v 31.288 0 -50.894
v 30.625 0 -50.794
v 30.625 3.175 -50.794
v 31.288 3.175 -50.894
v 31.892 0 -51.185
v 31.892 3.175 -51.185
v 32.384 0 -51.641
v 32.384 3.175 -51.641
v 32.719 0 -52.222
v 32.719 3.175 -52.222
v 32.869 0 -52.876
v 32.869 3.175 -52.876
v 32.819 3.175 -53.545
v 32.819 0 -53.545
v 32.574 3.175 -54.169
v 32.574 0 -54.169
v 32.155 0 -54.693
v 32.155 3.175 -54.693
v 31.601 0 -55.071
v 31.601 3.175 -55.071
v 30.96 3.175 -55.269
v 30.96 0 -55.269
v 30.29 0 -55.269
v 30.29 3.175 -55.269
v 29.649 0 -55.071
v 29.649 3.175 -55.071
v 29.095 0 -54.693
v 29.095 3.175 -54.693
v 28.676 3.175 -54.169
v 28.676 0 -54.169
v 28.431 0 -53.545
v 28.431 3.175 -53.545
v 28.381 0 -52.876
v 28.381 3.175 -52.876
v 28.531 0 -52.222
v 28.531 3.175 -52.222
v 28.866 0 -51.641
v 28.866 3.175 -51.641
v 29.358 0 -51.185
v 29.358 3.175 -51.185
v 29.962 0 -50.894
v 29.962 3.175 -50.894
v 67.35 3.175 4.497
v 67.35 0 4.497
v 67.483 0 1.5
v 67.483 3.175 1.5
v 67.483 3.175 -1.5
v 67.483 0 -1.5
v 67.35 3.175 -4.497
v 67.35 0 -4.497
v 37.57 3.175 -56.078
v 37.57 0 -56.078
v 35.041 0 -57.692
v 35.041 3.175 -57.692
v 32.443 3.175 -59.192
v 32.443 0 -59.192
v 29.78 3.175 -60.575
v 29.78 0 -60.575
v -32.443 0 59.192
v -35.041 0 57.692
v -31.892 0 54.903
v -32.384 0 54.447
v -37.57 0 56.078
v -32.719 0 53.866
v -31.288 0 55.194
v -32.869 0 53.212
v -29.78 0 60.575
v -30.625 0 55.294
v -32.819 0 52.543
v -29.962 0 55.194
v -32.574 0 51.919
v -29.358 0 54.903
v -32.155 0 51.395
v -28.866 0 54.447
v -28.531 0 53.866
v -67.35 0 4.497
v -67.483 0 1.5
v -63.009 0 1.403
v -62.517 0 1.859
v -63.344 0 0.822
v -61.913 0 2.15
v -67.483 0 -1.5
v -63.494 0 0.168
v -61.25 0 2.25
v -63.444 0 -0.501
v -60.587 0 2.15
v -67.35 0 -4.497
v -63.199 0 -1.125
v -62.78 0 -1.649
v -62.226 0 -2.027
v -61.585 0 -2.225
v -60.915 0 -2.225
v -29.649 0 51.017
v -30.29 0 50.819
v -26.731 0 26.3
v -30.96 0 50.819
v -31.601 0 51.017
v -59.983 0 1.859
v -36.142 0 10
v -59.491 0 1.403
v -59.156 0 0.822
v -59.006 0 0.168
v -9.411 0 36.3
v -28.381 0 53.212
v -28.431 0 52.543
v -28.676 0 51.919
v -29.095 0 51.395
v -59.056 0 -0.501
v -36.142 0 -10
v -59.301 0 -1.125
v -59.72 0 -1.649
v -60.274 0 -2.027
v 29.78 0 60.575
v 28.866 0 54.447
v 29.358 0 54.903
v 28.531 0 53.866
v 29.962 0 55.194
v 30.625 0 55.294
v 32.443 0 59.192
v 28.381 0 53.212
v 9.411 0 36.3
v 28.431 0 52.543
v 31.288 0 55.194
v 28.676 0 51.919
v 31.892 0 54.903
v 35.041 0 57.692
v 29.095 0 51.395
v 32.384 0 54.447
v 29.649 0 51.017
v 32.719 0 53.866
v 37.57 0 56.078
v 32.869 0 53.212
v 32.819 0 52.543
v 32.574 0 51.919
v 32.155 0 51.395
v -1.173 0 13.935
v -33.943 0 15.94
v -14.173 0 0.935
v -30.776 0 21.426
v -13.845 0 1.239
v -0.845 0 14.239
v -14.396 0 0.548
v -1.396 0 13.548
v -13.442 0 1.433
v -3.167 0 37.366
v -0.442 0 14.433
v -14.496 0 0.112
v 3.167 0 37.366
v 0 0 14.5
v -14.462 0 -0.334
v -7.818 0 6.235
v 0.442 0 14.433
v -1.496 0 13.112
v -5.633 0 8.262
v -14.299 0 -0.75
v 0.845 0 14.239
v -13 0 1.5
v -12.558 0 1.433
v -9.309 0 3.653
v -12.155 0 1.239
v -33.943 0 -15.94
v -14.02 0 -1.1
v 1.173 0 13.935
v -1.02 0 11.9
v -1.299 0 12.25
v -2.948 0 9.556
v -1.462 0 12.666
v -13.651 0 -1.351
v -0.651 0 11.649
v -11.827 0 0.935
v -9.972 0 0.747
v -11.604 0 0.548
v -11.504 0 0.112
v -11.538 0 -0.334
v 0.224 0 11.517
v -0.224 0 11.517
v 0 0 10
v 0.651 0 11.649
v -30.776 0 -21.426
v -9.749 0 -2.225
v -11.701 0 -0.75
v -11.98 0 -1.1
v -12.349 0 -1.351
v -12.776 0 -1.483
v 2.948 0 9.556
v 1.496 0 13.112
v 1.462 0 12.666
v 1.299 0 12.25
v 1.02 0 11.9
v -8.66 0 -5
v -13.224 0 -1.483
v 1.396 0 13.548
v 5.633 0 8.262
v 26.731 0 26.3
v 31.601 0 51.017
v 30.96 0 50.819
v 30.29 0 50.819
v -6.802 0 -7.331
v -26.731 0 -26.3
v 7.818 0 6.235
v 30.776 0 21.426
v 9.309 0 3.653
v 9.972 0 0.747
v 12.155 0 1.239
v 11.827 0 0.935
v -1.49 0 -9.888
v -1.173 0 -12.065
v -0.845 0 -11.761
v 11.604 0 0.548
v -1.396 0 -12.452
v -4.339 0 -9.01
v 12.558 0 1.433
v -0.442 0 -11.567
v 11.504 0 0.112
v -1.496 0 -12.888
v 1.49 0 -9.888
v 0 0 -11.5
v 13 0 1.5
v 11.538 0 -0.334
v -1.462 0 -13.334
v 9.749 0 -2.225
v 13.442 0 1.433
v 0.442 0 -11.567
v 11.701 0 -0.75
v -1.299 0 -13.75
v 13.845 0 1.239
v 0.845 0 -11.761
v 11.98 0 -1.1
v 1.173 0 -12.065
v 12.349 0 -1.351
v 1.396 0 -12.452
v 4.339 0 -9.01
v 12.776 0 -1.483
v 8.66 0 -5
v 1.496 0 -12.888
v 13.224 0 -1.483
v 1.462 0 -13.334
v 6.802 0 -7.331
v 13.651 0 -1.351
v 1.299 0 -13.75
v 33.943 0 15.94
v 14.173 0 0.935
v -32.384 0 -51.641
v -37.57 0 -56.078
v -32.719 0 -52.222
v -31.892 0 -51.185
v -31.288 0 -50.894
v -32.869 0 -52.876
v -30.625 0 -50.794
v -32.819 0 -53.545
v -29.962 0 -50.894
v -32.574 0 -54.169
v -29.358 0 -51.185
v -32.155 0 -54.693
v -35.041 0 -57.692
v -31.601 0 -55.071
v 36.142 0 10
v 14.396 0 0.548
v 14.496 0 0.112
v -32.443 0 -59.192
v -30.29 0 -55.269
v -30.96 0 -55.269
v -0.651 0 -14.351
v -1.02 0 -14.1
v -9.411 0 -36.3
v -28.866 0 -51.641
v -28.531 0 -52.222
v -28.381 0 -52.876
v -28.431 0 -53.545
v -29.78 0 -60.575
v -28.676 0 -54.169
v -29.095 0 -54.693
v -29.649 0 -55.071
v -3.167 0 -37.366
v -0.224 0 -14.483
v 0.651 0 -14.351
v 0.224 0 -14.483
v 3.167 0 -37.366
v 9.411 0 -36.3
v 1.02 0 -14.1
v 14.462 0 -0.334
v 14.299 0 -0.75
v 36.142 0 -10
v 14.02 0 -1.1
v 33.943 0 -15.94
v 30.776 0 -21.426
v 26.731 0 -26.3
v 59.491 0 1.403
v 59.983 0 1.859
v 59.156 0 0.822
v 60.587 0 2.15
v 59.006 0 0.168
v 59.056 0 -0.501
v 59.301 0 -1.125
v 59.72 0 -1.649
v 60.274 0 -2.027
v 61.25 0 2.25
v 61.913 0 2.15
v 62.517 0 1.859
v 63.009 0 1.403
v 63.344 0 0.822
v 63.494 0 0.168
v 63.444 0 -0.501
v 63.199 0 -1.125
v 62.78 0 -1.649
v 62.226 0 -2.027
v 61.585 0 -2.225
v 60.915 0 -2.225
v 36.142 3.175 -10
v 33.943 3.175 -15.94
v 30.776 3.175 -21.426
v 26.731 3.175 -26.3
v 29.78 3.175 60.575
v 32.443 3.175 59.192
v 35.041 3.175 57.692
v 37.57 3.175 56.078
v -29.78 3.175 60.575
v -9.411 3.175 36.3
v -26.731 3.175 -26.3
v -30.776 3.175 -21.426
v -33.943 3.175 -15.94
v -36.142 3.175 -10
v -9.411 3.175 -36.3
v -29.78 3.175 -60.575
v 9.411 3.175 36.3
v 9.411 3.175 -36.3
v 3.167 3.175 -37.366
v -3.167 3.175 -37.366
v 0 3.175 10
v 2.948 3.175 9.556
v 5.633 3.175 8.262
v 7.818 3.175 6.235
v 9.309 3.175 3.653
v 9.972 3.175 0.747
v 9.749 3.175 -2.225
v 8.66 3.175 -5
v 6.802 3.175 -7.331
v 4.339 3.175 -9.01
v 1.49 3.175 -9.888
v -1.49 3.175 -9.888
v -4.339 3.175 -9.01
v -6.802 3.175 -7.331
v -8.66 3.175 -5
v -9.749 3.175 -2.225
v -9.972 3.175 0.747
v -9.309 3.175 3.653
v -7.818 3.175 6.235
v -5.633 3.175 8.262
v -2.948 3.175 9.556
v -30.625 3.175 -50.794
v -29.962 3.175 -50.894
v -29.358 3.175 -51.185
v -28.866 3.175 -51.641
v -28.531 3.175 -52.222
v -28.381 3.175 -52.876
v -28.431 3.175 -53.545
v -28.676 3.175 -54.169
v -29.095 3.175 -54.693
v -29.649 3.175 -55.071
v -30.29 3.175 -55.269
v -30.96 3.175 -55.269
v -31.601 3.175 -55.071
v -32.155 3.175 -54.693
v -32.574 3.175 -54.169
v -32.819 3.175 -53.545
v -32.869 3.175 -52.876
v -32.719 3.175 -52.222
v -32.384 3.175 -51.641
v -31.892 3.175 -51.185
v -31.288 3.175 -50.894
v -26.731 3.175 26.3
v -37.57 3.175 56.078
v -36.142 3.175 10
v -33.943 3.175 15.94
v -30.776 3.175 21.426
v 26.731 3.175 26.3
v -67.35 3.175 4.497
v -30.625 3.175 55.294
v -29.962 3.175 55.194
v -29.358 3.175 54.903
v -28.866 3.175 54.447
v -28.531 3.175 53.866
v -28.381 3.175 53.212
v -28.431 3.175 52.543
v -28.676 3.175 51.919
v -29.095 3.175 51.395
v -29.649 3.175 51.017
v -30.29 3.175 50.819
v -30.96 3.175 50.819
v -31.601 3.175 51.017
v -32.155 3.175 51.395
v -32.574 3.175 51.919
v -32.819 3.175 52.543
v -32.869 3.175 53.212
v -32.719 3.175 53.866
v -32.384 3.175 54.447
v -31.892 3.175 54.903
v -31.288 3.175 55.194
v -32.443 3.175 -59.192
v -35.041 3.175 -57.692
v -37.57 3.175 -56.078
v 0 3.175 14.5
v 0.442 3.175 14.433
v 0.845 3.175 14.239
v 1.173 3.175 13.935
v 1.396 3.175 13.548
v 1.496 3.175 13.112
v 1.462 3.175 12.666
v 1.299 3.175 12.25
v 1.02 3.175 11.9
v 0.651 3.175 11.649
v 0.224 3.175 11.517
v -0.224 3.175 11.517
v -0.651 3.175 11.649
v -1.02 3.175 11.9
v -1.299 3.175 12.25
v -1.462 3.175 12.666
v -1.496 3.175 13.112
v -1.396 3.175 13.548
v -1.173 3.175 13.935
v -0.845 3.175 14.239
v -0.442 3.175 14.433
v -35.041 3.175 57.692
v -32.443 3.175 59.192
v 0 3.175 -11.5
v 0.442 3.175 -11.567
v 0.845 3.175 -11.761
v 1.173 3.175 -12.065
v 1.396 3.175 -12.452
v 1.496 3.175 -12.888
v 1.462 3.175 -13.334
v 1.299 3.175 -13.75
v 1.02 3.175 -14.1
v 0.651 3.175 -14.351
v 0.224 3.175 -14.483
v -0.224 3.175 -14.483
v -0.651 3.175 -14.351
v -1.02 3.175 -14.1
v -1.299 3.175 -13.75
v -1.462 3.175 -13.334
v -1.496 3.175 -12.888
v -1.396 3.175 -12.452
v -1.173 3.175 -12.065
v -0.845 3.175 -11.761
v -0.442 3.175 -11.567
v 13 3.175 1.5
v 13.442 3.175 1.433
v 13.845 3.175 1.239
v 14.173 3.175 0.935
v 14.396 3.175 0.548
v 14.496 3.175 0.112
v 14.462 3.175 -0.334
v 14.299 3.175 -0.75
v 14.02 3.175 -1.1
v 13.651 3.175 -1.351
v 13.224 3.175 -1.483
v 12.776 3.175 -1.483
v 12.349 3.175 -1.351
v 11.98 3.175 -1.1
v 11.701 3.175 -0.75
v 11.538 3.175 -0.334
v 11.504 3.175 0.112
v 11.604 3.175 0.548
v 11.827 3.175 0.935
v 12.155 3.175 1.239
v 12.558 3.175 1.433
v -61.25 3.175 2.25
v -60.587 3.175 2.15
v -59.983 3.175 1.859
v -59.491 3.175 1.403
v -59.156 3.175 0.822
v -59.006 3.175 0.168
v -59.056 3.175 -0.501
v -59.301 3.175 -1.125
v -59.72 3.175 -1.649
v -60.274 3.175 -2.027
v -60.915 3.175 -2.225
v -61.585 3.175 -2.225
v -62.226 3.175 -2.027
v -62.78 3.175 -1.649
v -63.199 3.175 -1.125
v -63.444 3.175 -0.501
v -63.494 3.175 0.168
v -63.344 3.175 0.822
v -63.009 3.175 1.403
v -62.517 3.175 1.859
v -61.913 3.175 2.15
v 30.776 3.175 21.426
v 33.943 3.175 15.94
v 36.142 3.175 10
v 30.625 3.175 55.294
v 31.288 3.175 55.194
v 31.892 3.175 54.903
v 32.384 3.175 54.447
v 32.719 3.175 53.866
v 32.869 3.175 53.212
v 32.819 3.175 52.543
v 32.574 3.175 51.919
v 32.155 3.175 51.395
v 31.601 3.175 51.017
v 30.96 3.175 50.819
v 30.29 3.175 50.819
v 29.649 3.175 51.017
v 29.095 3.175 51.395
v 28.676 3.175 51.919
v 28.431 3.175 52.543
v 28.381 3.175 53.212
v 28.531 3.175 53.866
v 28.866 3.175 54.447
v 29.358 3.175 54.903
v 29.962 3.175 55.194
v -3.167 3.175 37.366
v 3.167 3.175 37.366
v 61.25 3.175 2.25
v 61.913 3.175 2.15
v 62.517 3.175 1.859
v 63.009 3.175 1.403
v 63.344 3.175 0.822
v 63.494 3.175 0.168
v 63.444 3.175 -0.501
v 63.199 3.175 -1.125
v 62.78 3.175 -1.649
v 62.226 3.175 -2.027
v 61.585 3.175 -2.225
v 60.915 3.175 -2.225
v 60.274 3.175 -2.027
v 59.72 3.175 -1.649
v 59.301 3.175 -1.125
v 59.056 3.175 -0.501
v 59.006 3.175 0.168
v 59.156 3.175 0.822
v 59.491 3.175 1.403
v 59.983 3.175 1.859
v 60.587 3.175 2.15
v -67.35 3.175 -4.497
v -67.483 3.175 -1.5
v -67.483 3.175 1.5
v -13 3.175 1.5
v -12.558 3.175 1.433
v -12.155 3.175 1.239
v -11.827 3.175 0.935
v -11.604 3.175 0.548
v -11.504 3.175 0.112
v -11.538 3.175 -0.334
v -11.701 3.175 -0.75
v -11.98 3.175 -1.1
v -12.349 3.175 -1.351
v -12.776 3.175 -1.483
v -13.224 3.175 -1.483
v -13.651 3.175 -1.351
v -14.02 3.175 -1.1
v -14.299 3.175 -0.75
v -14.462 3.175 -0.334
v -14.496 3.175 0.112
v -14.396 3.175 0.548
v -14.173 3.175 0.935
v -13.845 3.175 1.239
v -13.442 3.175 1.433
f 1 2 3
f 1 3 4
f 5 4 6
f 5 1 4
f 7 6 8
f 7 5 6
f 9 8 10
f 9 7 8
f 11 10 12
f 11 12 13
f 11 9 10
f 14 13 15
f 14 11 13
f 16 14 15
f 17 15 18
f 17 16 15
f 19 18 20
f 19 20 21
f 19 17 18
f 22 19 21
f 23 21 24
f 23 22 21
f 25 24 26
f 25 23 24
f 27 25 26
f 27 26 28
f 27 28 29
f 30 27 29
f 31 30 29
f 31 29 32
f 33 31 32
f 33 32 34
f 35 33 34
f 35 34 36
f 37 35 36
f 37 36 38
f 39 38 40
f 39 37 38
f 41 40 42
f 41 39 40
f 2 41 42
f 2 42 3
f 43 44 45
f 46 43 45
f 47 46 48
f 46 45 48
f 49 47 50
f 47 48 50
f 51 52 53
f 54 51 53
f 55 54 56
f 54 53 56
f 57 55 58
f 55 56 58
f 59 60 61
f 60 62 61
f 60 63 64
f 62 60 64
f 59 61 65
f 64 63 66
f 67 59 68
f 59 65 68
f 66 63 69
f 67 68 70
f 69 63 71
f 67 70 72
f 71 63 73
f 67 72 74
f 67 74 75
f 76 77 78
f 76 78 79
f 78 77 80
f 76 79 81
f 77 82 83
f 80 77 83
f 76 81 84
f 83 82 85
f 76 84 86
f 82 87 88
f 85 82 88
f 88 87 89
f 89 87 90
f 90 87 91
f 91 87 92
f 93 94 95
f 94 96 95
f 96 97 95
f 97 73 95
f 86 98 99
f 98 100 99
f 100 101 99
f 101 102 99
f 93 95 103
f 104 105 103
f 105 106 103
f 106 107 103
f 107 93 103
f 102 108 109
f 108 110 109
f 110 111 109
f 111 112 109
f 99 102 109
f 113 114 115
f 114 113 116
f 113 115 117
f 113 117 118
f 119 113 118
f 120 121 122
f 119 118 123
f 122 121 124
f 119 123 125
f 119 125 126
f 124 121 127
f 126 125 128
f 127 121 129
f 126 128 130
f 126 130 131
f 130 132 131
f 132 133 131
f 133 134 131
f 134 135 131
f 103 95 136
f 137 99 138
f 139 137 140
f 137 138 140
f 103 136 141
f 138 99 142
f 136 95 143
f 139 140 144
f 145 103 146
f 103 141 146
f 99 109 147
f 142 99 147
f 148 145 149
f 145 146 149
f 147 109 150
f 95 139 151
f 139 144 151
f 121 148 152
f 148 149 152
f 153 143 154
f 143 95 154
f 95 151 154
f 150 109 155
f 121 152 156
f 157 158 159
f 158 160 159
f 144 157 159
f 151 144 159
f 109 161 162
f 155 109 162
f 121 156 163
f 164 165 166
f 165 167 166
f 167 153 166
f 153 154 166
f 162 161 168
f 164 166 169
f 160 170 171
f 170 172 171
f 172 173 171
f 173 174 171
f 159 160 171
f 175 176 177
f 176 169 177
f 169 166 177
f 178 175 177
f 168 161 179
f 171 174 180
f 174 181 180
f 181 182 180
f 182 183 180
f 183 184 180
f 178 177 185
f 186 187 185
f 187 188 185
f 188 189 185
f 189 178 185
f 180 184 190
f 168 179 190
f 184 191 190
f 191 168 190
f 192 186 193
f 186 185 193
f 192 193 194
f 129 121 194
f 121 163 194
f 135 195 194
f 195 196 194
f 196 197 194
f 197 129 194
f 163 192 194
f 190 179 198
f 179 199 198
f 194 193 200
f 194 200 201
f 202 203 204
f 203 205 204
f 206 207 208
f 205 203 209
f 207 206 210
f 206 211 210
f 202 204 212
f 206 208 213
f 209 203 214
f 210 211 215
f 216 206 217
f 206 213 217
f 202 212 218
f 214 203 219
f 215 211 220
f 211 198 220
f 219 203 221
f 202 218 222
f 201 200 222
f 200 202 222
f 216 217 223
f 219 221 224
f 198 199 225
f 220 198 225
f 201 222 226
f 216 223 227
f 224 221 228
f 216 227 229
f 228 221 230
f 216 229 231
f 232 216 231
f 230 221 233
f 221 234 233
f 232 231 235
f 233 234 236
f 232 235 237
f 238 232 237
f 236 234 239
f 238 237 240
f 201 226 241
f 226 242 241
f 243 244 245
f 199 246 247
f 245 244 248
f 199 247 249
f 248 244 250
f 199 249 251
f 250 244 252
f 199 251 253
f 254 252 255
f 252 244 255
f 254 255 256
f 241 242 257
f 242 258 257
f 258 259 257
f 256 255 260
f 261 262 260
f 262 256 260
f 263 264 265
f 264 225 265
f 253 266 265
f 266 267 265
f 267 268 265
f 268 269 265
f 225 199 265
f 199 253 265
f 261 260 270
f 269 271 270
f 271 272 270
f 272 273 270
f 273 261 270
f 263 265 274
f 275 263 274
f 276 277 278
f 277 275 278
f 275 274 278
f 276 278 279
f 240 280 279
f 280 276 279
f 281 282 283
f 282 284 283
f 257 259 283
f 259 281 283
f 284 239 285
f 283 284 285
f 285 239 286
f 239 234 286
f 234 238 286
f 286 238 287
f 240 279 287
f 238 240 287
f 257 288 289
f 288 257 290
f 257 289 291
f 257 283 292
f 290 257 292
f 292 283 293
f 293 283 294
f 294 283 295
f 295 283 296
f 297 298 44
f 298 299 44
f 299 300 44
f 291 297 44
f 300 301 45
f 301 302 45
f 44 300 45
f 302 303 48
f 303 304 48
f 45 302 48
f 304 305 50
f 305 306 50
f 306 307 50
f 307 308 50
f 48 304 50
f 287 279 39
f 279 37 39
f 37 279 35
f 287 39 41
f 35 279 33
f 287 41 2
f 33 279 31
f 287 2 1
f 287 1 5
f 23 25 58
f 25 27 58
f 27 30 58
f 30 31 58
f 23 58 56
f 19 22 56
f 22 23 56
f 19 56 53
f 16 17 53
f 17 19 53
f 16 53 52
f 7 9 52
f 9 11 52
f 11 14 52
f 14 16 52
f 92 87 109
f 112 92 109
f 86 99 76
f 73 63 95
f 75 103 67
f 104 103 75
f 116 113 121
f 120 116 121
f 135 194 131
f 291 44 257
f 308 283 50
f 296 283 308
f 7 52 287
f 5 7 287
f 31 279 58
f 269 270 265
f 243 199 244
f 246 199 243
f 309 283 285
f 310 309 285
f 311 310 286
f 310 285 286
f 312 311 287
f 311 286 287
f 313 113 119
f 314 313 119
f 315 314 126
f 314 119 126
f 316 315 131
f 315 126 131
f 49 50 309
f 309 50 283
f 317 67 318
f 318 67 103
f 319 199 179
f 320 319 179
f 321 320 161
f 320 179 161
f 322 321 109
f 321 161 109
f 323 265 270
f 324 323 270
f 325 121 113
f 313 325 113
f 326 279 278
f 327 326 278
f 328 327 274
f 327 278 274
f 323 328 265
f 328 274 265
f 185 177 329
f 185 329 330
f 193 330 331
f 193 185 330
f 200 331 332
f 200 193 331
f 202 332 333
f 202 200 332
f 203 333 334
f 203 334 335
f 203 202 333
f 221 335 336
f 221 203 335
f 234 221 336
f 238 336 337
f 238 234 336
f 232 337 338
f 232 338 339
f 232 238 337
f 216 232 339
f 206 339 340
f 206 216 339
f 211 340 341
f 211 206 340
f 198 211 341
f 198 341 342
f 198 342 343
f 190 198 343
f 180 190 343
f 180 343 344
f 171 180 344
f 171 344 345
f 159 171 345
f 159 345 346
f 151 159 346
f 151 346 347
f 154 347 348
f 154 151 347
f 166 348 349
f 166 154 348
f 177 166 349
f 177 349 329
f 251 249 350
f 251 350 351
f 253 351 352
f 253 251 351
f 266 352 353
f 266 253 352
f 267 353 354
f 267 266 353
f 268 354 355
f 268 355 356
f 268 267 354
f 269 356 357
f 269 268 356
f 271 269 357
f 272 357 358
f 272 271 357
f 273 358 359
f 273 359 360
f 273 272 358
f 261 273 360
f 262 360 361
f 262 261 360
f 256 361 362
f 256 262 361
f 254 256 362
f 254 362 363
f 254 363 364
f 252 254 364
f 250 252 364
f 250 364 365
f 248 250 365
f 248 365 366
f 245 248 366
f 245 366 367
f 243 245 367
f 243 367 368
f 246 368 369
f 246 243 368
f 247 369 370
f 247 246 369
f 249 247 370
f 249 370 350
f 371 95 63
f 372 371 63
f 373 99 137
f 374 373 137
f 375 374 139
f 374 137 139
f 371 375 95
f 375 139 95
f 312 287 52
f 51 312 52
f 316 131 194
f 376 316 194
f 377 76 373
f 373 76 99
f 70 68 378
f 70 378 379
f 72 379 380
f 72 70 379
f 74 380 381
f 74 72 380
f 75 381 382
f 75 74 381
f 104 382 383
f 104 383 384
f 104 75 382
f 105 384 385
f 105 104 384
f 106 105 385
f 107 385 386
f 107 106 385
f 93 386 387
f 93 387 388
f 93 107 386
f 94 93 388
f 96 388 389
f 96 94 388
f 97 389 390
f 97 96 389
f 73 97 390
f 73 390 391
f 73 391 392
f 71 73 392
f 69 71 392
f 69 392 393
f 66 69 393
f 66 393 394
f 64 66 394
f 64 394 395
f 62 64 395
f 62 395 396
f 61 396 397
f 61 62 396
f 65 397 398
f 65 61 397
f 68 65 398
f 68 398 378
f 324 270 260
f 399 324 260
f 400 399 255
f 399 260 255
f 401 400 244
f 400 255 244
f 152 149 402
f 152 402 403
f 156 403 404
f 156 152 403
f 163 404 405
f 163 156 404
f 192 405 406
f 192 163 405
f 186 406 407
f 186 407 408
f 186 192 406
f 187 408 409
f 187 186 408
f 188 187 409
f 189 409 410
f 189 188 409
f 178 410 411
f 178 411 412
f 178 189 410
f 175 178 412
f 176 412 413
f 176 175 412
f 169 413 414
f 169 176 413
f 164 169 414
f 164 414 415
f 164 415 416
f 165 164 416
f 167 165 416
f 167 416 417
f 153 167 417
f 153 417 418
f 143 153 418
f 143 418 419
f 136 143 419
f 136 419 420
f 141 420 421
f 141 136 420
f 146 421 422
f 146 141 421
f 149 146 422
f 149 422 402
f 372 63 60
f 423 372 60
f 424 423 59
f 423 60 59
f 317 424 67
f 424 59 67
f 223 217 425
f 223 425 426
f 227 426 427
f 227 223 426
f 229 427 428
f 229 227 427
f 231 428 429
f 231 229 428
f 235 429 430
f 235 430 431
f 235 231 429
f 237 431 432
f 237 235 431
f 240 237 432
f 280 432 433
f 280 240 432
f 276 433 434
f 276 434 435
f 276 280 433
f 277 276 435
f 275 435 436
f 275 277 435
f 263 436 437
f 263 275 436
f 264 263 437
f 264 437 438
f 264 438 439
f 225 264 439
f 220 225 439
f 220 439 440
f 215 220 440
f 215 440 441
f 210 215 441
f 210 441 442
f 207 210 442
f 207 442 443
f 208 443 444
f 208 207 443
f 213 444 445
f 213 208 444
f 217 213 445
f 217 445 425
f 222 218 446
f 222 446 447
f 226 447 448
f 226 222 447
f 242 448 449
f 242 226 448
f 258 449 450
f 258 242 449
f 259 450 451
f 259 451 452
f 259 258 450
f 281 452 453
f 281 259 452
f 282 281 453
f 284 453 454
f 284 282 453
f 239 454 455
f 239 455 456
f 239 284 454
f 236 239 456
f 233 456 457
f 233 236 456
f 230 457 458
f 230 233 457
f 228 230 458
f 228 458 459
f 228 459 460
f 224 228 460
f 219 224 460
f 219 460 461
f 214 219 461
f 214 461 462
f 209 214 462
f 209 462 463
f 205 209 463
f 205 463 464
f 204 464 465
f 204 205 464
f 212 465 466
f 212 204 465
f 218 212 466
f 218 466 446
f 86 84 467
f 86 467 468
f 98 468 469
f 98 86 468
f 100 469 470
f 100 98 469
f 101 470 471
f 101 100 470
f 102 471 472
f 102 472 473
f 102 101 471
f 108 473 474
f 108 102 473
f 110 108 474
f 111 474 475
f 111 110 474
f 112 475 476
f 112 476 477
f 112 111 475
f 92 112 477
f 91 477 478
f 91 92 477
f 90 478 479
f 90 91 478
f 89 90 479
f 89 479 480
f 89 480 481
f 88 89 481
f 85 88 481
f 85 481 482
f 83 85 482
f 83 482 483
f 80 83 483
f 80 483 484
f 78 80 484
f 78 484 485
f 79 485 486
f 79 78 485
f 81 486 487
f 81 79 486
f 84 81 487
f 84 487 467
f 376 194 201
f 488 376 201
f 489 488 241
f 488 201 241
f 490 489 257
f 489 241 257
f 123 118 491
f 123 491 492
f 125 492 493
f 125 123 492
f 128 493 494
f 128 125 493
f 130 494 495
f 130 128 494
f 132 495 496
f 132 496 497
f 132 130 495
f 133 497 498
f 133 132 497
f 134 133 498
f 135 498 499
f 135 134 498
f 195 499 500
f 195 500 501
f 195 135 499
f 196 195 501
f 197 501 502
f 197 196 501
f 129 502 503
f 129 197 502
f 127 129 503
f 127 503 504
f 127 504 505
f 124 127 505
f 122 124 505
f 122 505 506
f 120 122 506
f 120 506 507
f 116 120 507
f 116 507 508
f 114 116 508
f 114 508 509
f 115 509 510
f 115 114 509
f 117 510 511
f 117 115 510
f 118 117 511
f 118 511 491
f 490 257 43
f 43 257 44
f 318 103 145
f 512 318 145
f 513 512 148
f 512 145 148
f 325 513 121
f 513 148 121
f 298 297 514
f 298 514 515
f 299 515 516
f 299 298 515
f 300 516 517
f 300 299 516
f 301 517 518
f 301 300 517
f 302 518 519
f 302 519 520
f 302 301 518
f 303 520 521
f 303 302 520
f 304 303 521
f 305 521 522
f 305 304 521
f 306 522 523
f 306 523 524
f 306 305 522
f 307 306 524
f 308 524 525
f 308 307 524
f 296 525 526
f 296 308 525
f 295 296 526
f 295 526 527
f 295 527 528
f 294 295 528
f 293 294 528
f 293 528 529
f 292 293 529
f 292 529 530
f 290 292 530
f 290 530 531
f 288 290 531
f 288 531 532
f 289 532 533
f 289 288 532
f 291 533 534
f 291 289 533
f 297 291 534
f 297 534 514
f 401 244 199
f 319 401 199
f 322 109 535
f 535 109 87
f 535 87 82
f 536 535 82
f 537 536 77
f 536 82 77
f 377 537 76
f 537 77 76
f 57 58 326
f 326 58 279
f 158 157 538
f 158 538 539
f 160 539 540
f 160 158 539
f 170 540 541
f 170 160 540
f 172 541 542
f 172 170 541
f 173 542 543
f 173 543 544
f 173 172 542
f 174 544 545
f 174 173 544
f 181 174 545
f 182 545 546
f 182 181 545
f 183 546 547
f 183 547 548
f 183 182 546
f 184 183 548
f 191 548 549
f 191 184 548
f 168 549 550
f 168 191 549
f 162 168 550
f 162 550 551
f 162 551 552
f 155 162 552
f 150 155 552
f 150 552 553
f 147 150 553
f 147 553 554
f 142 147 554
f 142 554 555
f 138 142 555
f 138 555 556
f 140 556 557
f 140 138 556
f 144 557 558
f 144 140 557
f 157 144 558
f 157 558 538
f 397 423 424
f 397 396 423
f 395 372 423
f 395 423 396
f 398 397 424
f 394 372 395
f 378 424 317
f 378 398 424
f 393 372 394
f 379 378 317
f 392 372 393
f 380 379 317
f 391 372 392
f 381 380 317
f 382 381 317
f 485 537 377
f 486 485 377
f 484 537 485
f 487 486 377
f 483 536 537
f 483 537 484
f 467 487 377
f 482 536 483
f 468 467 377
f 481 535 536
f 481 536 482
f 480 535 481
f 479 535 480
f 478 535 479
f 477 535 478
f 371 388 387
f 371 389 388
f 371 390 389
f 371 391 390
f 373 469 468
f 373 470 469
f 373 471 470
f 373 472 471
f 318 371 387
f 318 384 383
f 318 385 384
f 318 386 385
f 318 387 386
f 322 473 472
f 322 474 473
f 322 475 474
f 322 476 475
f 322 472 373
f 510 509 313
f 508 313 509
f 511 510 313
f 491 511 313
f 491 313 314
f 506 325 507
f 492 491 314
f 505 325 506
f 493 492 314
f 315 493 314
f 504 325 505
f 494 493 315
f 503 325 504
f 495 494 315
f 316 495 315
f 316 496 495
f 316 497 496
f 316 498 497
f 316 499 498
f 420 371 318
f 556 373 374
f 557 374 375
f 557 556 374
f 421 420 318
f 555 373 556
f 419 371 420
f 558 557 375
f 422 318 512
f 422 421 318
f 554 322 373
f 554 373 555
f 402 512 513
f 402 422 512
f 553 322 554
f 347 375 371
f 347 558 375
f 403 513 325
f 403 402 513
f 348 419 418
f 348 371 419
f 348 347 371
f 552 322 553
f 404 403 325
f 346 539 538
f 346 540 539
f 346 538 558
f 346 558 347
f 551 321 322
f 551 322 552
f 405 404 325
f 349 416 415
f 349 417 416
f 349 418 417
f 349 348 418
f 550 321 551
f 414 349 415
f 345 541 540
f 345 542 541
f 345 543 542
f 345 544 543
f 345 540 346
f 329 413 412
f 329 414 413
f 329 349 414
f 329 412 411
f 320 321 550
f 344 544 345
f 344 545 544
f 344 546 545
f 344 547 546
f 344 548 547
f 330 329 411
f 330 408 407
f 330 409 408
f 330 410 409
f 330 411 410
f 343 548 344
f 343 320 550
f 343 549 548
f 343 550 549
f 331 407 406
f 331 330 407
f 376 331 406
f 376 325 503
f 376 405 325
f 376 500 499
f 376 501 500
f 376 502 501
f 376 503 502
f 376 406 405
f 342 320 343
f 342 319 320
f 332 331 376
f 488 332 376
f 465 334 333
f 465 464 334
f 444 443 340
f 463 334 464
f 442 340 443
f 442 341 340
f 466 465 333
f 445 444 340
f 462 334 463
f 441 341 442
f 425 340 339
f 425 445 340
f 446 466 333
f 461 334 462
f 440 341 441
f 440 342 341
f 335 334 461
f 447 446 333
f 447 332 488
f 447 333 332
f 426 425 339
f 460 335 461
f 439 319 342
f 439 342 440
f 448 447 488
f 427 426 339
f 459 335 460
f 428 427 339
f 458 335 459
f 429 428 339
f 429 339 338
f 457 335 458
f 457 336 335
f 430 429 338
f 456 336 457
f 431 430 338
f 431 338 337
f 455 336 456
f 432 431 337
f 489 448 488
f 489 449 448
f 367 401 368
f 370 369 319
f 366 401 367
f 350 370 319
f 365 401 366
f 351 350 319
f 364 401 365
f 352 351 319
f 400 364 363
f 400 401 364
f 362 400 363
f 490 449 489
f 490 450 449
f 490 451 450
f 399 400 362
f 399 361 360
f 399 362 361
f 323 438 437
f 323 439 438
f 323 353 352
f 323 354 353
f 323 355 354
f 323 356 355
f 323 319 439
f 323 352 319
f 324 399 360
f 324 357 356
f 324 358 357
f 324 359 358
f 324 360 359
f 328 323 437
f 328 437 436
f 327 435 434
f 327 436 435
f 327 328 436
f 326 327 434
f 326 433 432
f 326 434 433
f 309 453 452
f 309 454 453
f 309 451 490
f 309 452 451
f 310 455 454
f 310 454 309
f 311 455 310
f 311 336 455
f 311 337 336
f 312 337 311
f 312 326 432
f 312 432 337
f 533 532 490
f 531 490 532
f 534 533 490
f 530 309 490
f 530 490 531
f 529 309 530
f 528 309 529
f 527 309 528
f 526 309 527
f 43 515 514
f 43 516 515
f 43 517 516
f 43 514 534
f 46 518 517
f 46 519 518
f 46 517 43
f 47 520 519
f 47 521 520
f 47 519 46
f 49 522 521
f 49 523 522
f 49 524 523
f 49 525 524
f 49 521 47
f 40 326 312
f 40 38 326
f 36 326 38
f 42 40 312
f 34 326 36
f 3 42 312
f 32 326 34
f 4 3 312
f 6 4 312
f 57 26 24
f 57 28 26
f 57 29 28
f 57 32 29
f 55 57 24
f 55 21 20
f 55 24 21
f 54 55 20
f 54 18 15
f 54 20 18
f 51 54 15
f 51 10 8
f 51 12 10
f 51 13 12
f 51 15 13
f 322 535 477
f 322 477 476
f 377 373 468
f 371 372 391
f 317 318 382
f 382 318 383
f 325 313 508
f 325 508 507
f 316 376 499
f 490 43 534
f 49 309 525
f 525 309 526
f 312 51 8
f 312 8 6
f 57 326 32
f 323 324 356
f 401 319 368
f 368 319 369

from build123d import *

# Parameters (mm, degrees)
SKETCH2_R           = 10
SKETCH2_R_2         = 1.5
SKETCH2_R_3         = 2.25
BOSS_EXTRUDE1_DEPTH = 3.175


with BuildPart() as part:
    # Sketch2 → Boss-Extrude1 (new body)
    with BuildSketch(Plane(origin=(0, 0, 0), x_dir=(1, 0, 0), z_dir=(0, 1, 0))):
        with BuildLine():
            Line((-36.142080737, 10), (-67.350020101, 4.497198278))
            ThreePointArc((-67.350020101, 4.497198278), (-67.5, 0), (-67.350020101, -4.497198278))
            Line((-67.350020101, -4.497198278), (-36.142080737, -10))
            ThreePointArc((-36.142080737, -10), (-32.475952642, -18.75), (-26.731294406, -26.299960064))
            Line((-26.731294406, -26.299960064), (-37.569698005, -56.078229214))
            ThreePointArc((-37.569698005, -56.078229214), (-33.75, -58.456714755), (-29.780322096, -60.575427492))
            Line((-29.780322096, -60.575427492), (-9.410786331, -36.299960064))
            ThreePointArc((-9.410786331, -36.299960064), (0, -37.5), (9.410786331, -36.299960064))
            Line((9.410786331, -36.299960064), (29.780322096, -60.575427492))
            ThreePointArc((29.780322096, -60.575427492), (33.75, -58.456714755), (37.569698005, -56.078229214))
            Line((37.569698005, -56.078229214), (26.731294406, -26.299960064))
            ThreePointArc((26.731294406, -26.299960064), (32.475952642, -18.75), (36.142080737, -10))
            Line((36.142080737, -10), (67.350020101, -4.497198278))
            ThreePointArc((67.350020101, -4.497198278), (67.5, 0), (67.350020101, 4.497198278))
            Line((67.350020101, 4.497198278), (36.142080737, 10))
            ThreePointArc((36.142080737, 10), (32.475952642, 18.75), (26.731294406, 26.299960064))
            Line((26.731294406, 26.299960064), (37.569698005, 56.078229214))
            ThreePointArc((37.569698005, 56.078229214), (33.75, 58.456714755), (29.780322096, 60.575427492))
            Line((29.780322096, 60.575427492), (9.410786331, 36.299960064))
            ThreePointArc((9.410786331, 36.299960064), (0, 37.5), (-9.410786331, 36.299960064))
            Line((-9.410786331, 36.299960064), (-29.780322096, 60.575427492))
            ThreePointArc((-29.780322096, 60.575427492), (-33.75, 58.456714755), (-37.569698005, 56.078229214))
            Line((-37.569698005, 56.078229214), (-26.731294406, 26.299960064))
            ThreePointArc((-26.731294406, 26.299960064), (-32.475952642, 18.75), (-36.142080737, 10))
        make_face()
        with Locations(Location((0, 0, 0), (0, 0, 270))):
            Circle(SKETCH2_R, mode=Mode.SUBTRACT)
        with Locations(Location((0, 13, 0), (0, 0, 270))):
            Circle(SKETCH2_R_2, mode=Mode.SUBTRACT)
        with Locations(Location((13, 0, 0), (0, 0, 270))):
            Circle(SKETCH2_R_2, mode=Mode.SUBTRACT)
        with Locations(Location((0, -13, 0), (0, 0, 270))):
            Circle(SKETCH2_R_2, mode=Mode.SUBTRACT)
        with Locations(Location((-13, 0, 0), (0, 0, 270))):
            Circle(SKETCH2_R_2, mode=Mode.SUBTRACT)
        with Locations(Location((-61.25, 0, 0), (0, 0, 270))):
            Circle(SKETCH2_R_3, mode=Mode.SUBTRACT)
        with Locations(Location((-30.625, 53.044055982, 0), (0, 0, 270))):
            Circle(SKETCH2_R_3, mode=Mode.SUBTRACT)
        with Locations(Location((30.625, 53.044055982, 0), (0, 0, 270))):
            Circle(SKETCH2_R_3, mode=Mode.SUBTRACT)
        with Locations(Location((61.25, 0, 0), (0, 0, 270))):
            Circle(SKETCH2_R_3, mode=Mode.SUBTRACT)
        with Locations(Location((30.625, -53.044055982, 0), (0, 0, 270))):
            Circle(SKETCH2_R_3, mode=Mode.SUBTRACT)
        with Locations(Location((-30.625, -53.044055982, 0), (0, 0, 270))):
            Circle(SKETCH2_R_3, mode=Mode.SUBTRACT)
    extrude(amount=BOSS_EXTRUDE1_DEPTH)


solid = part.part
